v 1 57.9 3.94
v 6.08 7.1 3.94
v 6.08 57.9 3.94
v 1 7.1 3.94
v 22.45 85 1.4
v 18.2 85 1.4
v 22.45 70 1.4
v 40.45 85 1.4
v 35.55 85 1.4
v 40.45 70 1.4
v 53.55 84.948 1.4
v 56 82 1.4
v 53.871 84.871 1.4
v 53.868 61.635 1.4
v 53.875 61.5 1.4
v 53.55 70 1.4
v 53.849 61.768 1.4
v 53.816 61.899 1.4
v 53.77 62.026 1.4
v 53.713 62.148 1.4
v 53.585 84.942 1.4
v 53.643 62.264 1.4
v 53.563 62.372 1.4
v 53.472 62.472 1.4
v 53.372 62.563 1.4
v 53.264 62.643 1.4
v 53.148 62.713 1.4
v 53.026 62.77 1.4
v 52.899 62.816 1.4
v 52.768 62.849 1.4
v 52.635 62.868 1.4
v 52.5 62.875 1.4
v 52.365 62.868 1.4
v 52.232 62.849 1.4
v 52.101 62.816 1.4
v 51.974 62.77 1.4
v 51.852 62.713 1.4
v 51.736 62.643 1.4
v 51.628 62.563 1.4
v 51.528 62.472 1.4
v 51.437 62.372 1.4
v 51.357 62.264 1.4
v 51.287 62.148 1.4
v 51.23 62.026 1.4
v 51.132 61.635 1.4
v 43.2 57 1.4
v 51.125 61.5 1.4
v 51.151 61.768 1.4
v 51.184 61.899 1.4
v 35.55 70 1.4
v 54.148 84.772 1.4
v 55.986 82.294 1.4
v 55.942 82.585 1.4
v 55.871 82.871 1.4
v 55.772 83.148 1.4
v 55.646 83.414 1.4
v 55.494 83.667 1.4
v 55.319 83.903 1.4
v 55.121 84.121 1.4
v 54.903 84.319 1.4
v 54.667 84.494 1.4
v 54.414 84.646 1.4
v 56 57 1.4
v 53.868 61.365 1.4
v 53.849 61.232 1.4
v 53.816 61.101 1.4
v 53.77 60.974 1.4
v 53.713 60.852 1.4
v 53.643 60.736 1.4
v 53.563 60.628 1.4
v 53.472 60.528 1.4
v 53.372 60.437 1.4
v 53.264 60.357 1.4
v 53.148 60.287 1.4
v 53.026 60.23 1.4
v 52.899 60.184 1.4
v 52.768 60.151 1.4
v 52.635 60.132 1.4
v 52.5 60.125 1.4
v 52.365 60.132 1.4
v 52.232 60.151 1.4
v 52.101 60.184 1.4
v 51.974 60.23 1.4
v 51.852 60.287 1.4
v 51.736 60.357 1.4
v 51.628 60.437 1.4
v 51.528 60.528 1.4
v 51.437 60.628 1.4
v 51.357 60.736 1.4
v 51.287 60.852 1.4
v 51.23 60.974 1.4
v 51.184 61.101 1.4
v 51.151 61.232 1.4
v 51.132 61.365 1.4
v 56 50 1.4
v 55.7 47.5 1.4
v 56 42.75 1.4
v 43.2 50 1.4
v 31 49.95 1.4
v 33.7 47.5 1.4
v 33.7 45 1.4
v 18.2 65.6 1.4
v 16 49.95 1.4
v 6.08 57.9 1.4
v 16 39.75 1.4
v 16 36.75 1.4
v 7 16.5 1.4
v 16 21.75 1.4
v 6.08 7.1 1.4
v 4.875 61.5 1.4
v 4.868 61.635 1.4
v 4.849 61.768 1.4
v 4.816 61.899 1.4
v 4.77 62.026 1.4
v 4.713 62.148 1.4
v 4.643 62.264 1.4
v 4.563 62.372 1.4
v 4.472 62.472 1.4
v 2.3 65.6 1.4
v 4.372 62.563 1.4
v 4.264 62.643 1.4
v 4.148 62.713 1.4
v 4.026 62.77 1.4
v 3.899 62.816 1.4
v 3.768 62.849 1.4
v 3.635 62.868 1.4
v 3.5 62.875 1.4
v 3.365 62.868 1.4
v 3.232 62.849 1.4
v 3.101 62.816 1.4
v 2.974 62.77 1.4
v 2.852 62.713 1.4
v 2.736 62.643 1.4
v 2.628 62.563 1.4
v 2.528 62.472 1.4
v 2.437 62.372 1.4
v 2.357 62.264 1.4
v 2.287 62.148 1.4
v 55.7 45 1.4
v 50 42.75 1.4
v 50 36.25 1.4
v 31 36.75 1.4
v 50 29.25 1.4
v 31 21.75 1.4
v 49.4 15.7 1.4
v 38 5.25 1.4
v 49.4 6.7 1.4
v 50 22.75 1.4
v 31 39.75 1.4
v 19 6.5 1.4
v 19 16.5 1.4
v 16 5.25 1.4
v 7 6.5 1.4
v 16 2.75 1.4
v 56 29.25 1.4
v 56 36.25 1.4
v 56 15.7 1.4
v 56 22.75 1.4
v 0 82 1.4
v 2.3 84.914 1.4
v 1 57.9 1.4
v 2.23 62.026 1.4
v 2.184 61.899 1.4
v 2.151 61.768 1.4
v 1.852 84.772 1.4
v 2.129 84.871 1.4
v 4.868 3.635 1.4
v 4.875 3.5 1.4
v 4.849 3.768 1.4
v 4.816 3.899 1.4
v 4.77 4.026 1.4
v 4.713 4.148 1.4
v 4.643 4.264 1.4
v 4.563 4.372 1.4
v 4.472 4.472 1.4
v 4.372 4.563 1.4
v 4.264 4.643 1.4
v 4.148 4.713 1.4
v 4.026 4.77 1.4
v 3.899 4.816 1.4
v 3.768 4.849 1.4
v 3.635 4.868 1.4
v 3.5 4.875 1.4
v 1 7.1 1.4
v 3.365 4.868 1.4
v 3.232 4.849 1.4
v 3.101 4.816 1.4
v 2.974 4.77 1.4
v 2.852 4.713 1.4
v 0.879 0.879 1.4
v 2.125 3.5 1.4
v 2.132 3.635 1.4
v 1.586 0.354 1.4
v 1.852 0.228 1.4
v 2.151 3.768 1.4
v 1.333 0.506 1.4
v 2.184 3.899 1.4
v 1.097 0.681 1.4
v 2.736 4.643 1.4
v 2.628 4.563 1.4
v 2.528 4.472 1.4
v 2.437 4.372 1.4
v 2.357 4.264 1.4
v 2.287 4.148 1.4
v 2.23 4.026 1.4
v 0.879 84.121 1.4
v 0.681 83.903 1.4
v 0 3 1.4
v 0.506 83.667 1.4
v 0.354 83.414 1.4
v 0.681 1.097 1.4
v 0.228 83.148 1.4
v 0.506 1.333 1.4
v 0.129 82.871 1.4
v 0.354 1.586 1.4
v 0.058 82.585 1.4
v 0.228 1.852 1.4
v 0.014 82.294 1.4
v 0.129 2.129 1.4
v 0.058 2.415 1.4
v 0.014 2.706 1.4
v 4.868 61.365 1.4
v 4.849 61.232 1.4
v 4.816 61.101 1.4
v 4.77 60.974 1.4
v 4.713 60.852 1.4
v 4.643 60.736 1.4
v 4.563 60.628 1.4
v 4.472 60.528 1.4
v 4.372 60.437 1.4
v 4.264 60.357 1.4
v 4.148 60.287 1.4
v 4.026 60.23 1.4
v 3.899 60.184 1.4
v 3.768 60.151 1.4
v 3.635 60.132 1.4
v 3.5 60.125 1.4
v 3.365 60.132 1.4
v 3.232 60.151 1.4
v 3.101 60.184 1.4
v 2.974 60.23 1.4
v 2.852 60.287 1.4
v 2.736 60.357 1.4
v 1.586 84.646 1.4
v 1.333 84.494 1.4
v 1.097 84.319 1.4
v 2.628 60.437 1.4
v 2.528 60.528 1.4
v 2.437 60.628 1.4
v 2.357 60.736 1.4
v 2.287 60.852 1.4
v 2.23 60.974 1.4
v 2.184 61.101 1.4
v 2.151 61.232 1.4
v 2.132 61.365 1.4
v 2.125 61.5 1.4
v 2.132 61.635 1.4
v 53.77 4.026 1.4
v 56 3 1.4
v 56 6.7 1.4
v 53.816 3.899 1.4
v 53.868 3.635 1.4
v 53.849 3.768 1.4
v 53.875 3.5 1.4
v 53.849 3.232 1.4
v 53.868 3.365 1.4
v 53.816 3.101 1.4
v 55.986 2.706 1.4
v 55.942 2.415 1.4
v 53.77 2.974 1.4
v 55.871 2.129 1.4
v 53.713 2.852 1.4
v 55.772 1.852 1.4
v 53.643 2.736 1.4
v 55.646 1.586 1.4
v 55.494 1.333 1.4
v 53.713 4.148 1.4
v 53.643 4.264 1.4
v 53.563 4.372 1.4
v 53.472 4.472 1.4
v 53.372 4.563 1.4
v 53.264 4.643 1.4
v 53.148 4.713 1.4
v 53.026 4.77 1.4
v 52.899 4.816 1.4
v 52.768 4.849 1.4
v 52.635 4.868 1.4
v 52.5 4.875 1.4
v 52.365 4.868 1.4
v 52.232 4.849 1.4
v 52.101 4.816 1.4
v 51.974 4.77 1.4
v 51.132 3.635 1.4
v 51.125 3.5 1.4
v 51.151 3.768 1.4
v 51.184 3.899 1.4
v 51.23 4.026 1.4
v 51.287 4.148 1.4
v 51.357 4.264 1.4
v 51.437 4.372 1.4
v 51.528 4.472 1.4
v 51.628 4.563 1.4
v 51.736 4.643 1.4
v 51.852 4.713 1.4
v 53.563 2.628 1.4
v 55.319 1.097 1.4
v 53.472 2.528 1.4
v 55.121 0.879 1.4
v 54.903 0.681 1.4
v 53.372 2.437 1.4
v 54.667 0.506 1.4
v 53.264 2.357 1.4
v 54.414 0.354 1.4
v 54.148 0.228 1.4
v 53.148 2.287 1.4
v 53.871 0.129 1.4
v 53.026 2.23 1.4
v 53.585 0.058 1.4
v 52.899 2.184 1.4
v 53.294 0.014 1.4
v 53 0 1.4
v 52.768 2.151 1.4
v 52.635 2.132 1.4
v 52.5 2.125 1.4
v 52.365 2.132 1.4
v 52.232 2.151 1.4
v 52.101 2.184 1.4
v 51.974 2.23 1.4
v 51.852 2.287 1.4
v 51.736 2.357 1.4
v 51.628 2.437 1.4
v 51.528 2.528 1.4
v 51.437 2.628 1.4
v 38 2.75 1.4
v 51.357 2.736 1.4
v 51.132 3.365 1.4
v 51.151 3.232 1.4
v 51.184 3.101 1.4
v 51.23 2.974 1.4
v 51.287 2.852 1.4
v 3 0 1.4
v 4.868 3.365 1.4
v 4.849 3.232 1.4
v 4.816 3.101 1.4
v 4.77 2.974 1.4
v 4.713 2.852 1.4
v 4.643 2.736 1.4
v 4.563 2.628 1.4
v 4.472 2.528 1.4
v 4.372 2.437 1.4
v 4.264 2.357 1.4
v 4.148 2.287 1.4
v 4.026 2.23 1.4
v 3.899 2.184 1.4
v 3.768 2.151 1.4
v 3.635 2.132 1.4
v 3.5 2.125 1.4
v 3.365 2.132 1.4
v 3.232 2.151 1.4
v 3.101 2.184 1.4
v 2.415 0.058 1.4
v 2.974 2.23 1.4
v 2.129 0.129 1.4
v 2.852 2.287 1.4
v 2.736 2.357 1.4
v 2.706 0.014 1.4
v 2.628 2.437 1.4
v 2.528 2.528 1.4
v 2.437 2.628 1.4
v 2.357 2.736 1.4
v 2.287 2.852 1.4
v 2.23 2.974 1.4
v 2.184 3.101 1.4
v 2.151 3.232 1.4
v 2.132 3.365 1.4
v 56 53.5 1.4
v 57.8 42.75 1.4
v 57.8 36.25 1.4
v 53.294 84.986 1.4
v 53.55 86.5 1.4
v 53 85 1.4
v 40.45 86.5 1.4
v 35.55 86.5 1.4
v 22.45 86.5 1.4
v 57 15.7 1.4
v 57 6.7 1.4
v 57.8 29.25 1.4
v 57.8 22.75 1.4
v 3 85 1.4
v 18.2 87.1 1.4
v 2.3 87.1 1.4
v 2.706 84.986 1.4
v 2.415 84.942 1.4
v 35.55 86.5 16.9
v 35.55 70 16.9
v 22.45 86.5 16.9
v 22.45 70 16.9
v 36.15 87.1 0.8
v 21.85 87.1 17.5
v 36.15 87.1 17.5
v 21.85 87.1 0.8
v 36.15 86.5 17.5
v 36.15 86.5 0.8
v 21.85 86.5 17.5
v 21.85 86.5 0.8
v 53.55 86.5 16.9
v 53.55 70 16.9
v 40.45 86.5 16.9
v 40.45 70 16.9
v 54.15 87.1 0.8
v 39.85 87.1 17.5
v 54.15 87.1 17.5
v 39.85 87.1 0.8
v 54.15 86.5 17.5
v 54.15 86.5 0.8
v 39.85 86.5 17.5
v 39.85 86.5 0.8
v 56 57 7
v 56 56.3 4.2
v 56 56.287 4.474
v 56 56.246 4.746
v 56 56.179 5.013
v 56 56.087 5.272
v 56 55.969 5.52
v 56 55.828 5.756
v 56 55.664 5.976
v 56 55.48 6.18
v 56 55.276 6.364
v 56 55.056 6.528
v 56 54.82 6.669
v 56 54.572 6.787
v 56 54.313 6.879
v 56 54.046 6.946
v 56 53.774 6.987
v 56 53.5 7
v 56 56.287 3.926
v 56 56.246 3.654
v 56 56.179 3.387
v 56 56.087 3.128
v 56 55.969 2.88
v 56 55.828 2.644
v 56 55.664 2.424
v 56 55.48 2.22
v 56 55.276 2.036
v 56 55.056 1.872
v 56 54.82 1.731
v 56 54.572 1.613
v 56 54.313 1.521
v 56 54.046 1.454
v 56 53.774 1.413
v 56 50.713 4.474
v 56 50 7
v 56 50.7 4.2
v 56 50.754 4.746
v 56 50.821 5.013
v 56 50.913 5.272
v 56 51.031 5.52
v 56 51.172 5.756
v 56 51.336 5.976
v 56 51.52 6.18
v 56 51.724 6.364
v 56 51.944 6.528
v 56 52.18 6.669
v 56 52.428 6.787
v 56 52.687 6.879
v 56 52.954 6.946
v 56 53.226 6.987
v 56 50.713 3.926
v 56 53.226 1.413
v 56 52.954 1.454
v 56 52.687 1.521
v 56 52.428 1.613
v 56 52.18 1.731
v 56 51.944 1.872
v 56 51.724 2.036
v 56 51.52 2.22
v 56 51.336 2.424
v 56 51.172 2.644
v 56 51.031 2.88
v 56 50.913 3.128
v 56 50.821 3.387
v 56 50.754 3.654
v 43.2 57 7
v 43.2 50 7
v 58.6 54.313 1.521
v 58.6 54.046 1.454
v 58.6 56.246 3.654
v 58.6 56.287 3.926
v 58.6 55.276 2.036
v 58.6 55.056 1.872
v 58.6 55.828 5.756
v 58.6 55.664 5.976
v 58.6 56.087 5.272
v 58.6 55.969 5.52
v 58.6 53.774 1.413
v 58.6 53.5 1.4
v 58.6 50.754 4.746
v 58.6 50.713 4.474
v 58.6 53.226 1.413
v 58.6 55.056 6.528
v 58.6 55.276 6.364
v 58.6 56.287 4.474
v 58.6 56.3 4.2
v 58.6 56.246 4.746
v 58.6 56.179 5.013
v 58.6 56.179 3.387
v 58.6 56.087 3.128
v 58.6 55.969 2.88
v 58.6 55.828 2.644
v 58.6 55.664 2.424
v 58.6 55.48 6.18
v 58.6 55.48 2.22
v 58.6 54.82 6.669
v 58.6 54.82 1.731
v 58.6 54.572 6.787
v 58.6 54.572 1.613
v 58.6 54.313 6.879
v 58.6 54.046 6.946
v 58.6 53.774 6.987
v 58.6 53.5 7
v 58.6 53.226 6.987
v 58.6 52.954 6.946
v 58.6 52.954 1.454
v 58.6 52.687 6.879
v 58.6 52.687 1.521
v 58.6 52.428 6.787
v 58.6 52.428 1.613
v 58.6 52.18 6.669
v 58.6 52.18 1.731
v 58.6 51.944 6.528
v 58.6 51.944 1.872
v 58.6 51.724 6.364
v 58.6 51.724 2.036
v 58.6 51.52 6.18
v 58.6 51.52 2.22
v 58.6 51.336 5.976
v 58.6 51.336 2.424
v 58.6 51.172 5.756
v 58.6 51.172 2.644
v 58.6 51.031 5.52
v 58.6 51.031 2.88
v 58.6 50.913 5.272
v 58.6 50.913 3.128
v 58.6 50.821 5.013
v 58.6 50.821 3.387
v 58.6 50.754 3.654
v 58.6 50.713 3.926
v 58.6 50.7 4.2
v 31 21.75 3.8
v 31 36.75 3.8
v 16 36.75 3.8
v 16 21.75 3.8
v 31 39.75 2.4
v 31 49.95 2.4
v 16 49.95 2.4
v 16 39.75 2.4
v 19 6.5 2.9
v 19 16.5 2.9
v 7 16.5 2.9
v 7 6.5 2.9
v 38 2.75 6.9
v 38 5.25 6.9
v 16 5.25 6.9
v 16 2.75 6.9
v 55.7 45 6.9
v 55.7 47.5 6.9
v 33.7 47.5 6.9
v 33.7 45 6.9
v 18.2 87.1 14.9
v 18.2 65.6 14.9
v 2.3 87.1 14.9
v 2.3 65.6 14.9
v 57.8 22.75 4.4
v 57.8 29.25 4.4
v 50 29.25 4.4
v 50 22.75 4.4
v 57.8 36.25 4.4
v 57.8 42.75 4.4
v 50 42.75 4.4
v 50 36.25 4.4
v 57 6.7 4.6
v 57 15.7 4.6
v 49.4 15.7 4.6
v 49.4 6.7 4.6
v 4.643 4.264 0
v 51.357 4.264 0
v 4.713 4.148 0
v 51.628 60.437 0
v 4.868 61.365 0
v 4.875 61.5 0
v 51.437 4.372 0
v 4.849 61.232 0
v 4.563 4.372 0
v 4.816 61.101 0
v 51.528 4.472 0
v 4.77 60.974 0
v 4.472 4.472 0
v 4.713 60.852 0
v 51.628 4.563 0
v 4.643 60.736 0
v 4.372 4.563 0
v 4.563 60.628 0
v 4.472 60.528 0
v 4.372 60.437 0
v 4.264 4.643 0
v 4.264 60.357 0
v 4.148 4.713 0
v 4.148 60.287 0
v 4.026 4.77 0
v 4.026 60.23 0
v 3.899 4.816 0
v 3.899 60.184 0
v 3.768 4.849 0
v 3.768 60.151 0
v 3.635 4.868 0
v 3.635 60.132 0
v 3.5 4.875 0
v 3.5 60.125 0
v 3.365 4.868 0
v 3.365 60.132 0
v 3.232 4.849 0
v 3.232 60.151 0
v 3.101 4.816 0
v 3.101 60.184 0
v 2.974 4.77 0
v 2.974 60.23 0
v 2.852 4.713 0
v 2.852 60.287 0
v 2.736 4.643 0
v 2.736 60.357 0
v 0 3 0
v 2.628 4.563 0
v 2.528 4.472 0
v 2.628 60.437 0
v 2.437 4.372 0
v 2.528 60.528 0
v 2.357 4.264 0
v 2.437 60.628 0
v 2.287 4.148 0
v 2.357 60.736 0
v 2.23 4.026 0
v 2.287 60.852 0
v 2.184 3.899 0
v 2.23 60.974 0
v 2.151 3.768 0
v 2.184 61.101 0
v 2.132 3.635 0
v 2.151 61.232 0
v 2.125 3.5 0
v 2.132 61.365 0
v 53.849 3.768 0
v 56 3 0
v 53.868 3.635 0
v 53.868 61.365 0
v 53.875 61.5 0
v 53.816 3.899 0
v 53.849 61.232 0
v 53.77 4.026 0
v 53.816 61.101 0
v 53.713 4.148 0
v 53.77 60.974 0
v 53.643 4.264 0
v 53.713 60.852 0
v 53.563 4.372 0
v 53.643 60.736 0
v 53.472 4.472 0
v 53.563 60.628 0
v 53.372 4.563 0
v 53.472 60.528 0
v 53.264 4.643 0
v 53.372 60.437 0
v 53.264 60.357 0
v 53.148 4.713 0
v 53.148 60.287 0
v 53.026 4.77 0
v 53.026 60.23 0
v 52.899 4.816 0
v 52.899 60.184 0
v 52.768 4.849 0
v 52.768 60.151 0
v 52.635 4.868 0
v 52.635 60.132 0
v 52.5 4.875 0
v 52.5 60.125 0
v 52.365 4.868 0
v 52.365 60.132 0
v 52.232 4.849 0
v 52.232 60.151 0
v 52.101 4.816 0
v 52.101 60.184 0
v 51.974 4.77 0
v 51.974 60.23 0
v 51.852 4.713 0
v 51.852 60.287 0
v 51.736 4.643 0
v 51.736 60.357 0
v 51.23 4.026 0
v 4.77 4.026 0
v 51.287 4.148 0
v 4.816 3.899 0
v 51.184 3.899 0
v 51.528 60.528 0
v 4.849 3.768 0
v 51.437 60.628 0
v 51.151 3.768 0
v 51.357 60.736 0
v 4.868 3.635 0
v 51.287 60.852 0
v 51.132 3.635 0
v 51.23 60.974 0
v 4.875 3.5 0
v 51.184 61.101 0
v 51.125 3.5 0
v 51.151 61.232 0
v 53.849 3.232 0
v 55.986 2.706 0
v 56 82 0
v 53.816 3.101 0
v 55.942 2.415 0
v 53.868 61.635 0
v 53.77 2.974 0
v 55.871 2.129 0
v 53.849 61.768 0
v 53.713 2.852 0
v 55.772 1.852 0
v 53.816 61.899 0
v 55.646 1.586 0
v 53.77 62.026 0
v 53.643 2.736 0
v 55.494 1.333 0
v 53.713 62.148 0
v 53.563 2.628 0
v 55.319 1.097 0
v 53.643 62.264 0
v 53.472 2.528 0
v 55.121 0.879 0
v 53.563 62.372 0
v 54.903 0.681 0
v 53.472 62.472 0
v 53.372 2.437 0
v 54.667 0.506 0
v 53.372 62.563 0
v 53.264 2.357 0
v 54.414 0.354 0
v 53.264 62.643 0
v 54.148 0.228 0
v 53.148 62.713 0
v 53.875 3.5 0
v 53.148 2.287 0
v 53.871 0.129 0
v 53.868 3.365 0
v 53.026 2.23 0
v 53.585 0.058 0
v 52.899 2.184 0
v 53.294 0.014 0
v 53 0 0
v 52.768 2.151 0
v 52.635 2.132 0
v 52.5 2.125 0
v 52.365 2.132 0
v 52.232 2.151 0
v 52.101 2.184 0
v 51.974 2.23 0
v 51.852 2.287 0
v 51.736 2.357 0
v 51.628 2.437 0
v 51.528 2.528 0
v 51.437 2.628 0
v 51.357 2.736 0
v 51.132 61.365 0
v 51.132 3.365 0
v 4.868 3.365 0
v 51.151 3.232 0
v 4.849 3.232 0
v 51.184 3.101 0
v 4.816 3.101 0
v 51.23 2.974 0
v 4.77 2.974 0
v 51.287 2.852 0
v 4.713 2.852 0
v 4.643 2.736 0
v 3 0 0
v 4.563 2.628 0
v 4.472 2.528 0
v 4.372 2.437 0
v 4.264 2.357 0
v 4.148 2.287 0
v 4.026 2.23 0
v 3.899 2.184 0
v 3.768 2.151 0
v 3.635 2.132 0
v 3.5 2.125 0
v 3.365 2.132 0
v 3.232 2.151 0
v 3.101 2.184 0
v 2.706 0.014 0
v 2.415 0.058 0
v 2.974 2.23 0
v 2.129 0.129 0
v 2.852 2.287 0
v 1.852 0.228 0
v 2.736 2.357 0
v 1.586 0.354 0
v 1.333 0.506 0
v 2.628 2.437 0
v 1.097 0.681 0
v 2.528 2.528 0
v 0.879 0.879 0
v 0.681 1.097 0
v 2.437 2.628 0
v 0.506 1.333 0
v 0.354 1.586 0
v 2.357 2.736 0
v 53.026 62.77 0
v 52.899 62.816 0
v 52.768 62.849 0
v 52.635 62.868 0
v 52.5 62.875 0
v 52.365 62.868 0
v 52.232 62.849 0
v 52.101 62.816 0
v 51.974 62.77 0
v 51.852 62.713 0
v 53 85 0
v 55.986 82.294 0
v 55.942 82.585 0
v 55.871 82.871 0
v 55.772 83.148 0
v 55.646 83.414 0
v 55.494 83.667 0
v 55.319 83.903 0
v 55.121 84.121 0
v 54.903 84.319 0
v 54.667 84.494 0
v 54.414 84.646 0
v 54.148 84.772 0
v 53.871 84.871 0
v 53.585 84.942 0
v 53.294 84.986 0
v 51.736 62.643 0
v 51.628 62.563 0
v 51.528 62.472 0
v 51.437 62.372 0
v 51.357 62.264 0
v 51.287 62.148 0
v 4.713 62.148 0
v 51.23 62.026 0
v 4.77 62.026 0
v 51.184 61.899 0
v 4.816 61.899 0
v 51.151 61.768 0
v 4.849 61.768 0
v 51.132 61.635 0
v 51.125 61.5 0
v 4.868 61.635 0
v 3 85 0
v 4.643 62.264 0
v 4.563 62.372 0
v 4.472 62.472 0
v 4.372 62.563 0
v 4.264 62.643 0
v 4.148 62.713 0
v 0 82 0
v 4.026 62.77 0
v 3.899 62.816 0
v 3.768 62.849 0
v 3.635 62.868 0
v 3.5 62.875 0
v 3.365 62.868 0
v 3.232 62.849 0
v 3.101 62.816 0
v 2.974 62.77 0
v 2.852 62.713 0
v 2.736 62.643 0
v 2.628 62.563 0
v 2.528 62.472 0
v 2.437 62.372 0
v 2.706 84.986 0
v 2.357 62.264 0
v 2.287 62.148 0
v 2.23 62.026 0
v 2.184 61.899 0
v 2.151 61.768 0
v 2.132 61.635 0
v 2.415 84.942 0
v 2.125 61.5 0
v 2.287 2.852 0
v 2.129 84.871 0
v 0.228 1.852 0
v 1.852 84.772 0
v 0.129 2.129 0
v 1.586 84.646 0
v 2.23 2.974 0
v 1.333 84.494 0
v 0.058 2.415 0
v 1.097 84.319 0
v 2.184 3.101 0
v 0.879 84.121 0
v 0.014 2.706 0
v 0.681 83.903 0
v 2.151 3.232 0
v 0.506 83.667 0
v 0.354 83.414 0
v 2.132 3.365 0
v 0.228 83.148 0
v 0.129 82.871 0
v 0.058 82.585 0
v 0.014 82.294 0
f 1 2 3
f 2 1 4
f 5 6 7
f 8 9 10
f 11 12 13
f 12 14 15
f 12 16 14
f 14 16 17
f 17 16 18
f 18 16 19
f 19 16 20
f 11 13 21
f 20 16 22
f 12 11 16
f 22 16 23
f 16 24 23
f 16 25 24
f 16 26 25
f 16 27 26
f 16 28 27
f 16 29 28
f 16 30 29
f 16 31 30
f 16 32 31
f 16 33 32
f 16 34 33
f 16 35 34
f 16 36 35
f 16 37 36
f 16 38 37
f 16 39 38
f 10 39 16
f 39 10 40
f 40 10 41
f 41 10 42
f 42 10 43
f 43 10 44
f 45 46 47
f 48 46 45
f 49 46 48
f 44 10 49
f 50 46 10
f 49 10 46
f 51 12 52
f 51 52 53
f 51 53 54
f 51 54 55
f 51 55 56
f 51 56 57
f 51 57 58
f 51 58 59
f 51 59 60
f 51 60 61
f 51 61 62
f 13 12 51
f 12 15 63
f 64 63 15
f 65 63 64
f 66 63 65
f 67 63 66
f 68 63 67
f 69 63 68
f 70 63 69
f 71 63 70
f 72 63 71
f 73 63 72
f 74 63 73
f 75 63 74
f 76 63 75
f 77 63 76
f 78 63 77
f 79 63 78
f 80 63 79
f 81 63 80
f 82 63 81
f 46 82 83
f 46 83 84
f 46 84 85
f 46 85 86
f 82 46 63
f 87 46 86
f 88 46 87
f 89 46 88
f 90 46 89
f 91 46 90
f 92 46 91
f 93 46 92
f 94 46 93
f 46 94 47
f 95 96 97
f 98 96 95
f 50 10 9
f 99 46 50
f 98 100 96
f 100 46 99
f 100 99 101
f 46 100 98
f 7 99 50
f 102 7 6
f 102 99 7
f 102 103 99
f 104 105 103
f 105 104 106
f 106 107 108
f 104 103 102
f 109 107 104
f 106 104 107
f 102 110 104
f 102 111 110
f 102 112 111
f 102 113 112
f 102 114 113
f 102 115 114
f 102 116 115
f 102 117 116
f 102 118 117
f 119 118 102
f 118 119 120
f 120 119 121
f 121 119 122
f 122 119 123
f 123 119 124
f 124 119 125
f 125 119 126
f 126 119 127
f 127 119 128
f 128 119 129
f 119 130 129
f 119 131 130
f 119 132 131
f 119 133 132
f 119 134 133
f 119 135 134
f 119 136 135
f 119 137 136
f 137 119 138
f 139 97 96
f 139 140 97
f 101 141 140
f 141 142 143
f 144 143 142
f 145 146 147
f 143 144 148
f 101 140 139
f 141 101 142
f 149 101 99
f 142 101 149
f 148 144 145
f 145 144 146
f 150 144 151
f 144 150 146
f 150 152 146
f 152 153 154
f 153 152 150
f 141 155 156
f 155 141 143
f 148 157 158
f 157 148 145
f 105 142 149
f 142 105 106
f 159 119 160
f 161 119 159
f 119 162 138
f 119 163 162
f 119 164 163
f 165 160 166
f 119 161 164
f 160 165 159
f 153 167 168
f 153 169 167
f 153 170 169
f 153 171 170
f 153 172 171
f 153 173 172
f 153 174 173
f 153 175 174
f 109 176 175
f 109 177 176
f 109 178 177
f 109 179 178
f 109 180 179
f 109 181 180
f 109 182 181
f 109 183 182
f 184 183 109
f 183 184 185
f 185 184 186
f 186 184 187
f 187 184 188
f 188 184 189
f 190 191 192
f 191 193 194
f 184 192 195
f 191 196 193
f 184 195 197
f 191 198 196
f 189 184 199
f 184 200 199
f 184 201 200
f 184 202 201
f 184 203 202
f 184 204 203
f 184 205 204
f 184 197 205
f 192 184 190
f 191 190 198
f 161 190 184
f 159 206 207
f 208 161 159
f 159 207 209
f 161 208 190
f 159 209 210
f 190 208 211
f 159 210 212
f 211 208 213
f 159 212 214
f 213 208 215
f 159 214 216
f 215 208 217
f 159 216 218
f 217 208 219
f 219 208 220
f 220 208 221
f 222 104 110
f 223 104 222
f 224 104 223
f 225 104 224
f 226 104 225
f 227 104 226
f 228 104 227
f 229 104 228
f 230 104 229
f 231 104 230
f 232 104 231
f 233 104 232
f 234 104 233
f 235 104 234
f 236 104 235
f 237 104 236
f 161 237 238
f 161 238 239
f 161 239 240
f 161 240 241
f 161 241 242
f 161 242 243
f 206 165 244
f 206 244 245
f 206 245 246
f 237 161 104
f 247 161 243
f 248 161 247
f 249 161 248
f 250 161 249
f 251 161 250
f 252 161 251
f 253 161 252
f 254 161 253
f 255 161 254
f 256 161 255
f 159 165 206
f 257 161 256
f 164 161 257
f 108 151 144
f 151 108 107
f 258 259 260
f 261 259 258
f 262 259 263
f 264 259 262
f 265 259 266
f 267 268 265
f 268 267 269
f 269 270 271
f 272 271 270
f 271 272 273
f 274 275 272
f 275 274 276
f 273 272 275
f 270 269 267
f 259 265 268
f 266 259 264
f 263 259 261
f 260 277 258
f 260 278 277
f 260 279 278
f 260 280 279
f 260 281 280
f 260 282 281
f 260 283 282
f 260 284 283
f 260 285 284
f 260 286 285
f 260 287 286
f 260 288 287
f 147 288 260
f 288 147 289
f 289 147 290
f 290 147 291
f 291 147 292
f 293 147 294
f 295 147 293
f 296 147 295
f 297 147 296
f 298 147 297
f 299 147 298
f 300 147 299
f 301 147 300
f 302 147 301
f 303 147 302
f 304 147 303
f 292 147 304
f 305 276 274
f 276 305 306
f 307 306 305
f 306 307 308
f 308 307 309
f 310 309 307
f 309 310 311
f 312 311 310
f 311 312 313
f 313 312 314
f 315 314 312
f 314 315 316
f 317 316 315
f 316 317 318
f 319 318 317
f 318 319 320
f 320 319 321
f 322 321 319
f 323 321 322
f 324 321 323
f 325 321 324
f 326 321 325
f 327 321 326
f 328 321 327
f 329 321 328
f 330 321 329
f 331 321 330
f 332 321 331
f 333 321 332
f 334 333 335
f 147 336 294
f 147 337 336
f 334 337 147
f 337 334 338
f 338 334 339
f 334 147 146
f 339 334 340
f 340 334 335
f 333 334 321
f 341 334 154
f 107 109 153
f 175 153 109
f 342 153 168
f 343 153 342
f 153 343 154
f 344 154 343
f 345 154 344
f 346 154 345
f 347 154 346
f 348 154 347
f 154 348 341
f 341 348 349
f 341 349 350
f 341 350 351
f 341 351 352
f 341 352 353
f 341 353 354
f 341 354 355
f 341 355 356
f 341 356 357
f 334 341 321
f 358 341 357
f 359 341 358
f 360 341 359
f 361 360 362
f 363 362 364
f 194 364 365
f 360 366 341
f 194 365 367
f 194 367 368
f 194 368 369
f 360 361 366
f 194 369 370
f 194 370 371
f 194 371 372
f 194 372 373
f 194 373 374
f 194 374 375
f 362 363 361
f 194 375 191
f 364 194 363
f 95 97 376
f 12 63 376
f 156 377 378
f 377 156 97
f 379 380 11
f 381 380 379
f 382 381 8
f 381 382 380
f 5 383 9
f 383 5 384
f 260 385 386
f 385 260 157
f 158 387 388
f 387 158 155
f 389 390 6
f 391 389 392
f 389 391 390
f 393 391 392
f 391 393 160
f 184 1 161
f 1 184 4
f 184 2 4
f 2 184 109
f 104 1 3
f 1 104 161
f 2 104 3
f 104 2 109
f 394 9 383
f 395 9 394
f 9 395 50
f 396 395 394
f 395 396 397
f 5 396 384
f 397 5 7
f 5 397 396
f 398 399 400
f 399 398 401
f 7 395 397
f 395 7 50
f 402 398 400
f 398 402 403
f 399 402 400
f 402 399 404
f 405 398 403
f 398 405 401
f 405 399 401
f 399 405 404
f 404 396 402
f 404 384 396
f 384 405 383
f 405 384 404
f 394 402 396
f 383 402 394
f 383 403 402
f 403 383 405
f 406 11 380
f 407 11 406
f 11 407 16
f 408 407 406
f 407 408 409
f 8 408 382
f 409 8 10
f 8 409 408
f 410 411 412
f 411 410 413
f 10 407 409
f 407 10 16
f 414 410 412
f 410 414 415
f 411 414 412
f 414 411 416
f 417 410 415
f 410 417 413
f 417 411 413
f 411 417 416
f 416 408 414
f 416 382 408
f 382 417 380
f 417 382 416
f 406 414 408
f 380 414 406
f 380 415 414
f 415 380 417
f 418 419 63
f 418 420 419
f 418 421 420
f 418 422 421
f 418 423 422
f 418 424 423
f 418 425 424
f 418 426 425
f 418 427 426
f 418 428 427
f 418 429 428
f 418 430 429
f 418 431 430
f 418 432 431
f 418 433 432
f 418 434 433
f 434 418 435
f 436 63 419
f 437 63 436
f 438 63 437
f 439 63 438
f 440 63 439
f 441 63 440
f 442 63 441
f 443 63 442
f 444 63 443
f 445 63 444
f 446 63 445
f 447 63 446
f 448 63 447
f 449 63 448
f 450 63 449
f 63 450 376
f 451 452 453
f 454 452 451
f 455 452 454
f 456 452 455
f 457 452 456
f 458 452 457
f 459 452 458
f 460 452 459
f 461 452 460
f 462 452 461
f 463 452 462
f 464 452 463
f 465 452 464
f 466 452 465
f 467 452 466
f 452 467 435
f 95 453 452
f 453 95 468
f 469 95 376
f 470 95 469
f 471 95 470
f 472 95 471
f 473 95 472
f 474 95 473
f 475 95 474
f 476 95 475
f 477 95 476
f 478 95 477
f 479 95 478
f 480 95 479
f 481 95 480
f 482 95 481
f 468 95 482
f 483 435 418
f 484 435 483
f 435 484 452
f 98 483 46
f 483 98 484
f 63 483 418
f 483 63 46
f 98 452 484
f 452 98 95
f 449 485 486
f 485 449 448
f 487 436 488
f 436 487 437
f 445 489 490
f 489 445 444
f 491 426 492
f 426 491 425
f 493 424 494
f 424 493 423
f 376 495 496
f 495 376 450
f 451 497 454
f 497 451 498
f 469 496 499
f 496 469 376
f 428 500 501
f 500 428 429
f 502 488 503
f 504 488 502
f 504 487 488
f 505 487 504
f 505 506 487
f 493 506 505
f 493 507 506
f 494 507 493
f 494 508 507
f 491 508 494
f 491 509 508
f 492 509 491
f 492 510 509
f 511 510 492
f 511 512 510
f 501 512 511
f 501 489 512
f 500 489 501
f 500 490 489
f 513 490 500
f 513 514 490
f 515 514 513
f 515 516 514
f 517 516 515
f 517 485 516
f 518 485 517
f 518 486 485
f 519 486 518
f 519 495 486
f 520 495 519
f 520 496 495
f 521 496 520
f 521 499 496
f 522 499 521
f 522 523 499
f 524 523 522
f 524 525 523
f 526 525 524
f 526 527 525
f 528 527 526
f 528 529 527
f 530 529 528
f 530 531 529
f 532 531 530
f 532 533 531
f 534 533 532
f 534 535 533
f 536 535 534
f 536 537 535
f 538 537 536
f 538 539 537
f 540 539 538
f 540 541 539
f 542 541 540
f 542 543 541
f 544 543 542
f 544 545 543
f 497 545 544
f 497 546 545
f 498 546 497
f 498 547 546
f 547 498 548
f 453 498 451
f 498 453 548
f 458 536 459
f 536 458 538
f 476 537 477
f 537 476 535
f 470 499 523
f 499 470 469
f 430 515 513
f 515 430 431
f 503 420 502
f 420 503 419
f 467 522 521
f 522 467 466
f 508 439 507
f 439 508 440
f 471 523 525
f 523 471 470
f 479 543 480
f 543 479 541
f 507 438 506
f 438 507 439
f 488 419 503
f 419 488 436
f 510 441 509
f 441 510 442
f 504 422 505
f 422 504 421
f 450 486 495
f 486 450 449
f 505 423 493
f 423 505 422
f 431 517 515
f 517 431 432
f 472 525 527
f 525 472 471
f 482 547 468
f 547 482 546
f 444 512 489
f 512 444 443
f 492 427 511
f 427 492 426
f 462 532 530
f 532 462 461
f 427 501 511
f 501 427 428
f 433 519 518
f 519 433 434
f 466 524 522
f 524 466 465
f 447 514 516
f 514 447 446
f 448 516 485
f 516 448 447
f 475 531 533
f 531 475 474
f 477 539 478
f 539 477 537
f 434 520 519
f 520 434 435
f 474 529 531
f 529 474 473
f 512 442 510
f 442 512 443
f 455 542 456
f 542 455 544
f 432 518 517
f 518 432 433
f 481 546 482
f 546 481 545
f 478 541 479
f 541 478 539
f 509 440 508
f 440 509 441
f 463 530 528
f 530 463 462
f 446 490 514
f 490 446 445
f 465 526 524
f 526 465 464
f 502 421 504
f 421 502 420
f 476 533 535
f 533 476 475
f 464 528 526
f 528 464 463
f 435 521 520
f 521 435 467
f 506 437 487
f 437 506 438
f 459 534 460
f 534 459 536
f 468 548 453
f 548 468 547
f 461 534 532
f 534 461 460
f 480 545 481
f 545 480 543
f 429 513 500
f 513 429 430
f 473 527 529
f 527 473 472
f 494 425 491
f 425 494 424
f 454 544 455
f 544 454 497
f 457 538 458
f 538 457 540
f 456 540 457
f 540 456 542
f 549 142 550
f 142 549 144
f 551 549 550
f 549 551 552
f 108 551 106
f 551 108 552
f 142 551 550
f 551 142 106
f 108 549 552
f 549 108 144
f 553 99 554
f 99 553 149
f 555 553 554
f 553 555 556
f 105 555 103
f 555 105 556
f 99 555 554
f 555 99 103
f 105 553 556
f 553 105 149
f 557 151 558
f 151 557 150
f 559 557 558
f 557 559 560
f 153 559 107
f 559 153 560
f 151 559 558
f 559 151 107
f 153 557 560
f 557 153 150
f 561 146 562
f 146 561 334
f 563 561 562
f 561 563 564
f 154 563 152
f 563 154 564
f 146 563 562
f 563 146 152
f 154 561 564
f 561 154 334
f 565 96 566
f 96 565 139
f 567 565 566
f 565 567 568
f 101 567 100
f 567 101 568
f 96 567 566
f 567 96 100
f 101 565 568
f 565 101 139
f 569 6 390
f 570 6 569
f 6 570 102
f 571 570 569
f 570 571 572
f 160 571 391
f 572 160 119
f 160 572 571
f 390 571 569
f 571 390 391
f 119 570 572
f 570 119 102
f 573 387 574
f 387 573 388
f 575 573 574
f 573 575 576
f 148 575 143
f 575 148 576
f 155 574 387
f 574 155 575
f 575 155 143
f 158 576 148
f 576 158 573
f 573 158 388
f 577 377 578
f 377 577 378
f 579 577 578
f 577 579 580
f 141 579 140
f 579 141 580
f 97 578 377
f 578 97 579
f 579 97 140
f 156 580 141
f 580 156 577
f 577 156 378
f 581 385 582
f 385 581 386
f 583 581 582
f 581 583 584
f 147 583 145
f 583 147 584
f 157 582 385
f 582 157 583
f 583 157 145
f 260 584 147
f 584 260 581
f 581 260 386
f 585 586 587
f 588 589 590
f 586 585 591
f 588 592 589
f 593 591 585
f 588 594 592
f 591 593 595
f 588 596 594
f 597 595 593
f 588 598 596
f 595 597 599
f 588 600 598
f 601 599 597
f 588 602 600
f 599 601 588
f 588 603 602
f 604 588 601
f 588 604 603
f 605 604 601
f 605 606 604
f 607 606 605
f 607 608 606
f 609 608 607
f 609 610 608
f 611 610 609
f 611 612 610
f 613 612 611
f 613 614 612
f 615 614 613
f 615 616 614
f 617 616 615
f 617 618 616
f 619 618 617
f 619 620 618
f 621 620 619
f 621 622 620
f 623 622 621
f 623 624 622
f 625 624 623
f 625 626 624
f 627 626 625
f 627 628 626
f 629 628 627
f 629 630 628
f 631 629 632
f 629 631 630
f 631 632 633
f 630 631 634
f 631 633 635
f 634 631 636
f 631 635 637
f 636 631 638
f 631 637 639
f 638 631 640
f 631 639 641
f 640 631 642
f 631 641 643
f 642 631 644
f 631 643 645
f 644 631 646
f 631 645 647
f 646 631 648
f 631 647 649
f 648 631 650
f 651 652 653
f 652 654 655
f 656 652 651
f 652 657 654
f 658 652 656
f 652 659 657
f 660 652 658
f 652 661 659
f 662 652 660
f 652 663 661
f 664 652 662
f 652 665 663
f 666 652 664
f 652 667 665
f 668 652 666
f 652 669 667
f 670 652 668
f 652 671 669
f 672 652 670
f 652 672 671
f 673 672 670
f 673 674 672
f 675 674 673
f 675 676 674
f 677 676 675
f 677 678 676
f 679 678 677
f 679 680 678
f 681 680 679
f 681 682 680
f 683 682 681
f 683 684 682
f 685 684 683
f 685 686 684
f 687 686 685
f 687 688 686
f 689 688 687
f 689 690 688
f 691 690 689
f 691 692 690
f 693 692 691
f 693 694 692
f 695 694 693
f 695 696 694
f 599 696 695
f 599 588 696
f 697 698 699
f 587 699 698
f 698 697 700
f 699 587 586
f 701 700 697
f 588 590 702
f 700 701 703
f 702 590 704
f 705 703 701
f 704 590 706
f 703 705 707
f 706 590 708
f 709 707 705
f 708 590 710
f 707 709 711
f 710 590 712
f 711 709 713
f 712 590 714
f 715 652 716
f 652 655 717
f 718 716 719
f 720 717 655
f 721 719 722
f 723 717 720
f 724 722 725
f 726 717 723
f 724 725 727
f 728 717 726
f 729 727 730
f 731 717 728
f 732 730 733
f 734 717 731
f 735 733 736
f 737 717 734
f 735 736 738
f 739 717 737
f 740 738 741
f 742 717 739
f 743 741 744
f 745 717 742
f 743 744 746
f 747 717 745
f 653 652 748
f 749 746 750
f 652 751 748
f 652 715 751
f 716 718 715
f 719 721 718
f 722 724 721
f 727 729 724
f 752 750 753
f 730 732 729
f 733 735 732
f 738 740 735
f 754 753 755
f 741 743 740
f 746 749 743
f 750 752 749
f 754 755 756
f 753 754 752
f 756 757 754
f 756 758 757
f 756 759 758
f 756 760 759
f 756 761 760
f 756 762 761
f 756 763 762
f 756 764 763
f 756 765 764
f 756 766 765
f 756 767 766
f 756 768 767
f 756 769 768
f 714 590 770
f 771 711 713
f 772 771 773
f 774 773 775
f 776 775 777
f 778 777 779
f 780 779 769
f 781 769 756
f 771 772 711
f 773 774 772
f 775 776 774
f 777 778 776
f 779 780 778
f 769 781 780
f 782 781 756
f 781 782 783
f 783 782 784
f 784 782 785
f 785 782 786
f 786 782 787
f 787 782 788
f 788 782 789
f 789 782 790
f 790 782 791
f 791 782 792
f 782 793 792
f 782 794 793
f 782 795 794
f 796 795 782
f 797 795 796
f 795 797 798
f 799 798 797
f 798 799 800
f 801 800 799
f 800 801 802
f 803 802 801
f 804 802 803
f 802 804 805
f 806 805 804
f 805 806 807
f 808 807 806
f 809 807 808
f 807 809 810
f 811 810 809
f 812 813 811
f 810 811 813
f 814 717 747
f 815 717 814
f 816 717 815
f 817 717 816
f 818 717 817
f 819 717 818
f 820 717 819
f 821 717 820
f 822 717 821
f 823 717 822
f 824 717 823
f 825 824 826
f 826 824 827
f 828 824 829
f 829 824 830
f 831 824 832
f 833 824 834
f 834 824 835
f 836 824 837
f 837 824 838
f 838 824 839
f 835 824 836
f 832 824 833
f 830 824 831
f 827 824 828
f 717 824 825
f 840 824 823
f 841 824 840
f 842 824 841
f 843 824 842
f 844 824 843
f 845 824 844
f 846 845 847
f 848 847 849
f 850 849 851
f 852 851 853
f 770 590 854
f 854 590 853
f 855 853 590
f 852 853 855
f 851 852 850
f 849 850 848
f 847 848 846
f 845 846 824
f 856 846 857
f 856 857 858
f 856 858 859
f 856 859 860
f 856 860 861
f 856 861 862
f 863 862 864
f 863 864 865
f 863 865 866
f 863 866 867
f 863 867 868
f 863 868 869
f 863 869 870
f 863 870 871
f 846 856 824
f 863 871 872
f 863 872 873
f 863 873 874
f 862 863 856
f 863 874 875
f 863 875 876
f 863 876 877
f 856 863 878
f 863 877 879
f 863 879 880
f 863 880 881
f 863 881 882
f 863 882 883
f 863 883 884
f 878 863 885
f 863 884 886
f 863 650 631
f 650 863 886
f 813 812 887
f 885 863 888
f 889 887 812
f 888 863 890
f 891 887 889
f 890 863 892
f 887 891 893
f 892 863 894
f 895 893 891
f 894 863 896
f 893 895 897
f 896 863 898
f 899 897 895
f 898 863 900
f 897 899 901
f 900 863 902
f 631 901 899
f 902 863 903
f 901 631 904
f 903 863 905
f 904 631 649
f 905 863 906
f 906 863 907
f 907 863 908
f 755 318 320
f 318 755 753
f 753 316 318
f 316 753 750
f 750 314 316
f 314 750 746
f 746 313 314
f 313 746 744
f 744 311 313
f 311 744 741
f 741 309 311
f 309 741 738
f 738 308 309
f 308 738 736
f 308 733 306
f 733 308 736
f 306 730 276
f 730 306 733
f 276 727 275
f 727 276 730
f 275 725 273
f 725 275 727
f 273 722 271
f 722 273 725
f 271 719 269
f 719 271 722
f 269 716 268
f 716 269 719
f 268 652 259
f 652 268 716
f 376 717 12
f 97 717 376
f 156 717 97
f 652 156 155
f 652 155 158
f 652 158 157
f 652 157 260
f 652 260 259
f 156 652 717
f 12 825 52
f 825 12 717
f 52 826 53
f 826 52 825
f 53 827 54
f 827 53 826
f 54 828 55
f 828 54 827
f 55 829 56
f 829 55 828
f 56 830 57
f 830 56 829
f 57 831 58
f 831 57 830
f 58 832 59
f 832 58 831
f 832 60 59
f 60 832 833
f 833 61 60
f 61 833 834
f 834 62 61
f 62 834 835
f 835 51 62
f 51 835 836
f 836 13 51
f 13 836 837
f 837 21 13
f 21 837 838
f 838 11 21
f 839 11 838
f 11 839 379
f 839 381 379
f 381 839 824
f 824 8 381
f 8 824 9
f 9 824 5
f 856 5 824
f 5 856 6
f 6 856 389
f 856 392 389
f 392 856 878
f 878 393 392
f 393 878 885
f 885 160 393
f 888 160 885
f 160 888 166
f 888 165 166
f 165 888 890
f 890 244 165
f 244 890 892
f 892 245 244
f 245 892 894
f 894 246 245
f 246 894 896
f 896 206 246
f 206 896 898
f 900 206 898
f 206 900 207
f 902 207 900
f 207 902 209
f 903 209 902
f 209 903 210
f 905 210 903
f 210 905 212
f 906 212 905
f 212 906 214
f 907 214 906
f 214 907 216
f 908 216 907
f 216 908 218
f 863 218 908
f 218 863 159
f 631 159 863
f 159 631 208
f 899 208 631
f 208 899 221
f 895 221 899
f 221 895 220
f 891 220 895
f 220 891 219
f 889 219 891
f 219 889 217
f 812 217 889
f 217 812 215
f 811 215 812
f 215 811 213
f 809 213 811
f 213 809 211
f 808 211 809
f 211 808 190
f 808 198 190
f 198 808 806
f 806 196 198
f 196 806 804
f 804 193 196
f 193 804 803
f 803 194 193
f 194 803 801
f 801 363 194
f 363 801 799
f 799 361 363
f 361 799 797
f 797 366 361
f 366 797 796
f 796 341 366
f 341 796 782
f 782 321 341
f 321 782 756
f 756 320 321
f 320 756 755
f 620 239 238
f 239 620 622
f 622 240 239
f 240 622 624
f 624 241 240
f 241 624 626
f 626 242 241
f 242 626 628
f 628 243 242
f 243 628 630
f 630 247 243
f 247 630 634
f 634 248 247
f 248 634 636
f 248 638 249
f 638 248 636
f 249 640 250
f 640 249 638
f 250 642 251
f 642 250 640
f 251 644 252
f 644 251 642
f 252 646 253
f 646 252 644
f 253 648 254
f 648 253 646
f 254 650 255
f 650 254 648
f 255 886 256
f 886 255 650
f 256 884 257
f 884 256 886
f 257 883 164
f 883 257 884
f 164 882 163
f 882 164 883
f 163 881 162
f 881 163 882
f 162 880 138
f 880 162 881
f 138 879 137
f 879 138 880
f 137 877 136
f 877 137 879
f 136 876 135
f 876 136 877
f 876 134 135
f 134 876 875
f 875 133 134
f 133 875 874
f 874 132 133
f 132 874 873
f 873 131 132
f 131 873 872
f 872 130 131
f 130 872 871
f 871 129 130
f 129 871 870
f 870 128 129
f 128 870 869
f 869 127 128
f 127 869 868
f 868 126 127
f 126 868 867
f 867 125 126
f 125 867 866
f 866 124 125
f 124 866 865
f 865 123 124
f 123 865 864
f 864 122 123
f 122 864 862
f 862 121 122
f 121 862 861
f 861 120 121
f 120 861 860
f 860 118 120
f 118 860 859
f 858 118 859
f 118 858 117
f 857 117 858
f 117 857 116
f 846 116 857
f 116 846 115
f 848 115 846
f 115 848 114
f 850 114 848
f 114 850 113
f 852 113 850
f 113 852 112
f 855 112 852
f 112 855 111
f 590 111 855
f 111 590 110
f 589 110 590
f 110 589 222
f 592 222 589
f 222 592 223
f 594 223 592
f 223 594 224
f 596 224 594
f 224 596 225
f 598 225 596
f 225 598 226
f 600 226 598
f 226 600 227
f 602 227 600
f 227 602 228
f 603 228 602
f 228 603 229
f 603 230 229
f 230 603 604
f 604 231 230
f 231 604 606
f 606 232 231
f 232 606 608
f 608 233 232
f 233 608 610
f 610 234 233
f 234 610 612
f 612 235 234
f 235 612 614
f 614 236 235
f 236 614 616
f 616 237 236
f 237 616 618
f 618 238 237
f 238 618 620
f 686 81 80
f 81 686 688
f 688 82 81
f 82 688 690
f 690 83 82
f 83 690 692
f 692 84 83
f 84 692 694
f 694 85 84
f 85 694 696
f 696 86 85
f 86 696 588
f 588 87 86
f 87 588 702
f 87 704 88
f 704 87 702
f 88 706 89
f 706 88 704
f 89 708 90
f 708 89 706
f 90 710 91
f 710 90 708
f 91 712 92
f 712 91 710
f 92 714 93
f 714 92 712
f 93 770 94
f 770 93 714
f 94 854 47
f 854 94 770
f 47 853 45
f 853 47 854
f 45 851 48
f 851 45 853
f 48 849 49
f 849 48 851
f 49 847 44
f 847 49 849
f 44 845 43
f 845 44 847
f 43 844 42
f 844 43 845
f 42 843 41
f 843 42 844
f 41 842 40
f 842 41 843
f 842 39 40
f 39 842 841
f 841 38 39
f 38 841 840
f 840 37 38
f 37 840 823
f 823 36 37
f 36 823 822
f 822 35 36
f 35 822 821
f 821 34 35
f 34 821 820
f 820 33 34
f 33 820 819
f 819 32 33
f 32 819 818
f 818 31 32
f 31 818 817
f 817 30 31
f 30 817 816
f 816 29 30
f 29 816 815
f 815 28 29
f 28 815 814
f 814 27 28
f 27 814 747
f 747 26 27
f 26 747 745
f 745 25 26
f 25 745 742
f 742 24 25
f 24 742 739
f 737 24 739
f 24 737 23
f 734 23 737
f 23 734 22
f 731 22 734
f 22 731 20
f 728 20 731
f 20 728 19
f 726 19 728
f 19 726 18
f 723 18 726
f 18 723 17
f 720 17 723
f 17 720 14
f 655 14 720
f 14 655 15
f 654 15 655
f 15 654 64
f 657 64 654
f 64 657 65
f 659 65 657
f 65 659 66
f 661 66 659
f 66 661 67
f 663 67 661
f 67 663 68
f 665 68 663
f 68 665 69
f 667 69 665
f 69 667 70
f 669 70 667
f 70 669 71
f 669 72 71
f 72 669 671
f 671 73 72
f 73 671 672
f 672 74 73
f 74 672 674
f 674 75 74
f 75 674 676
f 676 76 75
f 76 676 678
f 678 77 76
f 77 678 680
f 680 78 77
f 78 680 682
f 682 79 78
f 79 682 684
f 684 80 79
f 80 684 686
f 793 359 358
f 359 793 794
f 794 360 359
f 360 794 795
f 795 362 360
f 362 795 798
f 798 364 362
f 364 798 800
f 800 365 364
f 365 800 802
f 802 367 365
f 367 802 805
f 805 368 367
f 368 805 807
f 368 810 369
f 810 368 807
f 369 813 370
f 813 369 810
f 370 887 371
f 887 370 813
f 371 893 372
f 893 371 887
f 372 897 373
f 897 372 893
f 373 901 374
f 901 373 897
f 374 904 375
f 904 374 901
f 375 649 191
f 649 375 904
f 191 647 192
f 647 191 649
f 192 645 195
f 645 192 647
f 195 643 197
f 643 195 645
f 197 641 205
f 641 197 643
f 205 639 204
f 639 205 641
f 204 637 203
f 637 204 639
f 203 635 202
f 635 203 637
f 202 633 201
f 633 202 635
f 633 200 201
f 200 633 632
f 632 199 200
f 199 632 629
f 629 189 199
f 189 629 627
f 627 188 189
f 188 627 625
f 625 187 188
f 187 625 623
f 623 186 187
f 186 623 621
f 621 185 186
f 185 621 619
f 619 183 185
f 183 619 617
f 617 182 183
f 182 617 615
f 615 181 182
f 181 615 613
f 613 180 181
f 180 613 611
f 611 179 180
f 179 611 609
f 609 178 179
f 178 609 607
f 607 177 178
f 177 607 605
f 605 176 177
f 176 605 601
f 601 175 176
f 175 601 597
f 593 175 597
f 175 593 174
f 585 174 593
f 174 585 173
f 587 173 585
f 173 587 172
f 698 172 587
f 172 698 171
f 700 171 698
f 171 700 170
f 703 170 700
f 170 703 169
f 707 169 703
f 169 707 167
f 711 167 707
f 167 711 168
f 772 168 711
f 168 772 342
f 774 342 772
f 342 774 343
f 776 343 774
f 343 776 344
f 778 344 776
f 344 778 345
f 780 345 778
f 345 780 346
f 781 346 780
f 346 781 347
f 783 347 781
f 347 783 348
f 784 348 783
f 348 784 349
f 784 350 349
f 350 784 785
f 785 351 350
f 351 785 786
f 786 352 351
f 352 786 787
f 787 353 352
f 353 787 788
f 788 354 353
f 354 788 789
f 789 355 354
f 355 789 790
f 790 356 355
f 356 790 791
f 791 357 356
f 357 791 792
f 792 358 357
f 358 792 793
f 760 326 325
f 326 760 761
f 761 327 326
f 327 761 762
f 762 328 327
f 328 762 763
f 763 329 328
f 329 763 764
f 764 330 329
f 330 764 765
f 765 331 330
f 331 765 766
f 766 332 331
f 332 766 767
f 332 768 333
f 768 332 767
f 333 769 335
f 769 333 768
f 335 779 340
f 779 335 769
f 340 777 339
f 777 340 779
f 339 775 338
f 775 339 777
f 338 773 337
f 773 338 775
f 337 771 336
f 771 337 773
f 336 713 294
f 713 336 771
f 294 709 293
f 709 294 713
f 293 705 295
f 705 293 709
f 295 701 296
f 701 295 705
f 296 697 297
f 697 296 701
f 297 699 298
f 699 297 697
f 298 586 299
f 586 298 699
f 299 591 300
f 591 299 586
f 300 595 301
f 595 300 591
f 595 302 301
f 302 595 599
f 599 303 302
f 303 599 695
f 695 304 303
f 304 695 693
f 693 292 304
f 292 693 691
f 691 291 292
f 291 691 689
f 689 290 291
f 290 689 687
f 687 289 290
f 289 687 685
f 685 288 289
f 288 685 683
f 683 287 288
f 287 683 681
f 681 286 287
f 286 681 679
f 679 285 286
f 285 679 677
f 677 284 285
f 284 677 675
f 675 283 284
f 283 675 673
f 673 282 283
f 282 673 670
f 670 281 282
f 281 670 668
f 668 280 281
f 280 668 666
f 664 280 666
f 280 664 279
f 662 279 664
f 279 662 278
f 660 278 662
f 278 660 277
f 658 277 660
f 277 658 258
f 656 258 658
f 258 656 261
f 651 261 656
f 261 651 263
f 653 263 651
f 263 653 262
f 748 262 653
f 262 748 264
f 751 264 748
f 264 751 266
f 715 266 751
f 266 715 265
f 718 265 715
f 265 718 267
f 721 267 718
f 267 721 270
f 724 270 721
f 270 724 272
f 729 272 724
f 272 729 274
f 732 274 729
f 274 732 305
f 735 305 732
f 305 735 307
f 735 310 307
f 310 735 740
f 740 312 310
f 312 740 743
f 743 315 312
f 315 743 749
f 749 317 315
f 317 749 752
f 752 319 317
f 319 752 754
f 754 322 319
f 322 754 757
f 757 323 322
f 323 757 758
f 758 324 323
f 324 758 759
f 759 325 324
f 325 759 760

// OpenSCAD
//------------------------------------------------------------------------
// OpenSCAD models of miscellaneous components and devices:
// various Raspberry Pi models, SainSmart Relays, PCD8544 LCD, etc.
//
// Author:      Niccolo Rigacci <niccolo@rigacci.org>
// Version:     1.0 2017-12-14
// License:     GNU General Public License v3.0
// Modified:    by Richard Jelbert 5th January 2021 for RPi 4
//------------------------------------------------------------------------

// Interference for 3D union(), difference() and intersection();
// used to avoid the manifold problem.
interf = 0.2;

//------------------------------------------------------------------------
// Matrix of 2.54 mm pins.
//------------------------------------------------------------------------
module pin_headers(cols, rows) {
    w = 2.54; h = 2.54; p = 0.65;
    for(x = [0 : (cols -1)]) {
        for(y = [0 : (rows  - 1)]) {
            translate([w * x, w * y, 0]) {
                union() {
                    color("black") cube([w, w, h]);
                    //color("gold")  translate([(w - p) / 2, (w - p) / 2, -3]) cube([p, p, 11.54]);
                }
            }
        }
    }
}

//------------------------------------------------------------------------
// Sub-models for the Raspberry Pi 4 Model
//------------------------------------------------------------------------

module ethernet_connector(x, y, z) {
    color("silver") cube([x, y, z]);
}
module usb_connector(x, y, z) {
    f = 0.6; // Flange
    color("silver") cube([x, y, z]);
    translate([-f, y - f, -f])
        color("silver") cube([x + f * 2, f, z + f * 2]);
}
module hdmi_connector(x, y, z) {
    color("silver") cube([x, y, z]);
}
module usbc_connector(x, y, z) {
    color("silver") cube([x, y, z]);
}
module capacitor(d, h) {
    color("silver") cylinder(r=(d / 2), h=h);
}
module micro_sd_card() {
    color("silver")   translate([1.5,  0.0, -1.5]) cube([12, 12.5, 1.5]);
    color("orange") translate([2, -3.2, -1.0]) cube([11, 15, 1.0]);
}
module audio_video(size_x) {
    fn = 64;
    color([58/255, 58/255, 58/255]) {
        cube([size_x, 7, 5.6]);
        translate([size_x, 7 / 2, 5.6 / 2]) rotate([0,90,0]) cylinder(d=5.6, h=2.6, $fn = fn);
    }

}
module cpu() {
    color("silver")
    cube([15,15,2.4]);
}

module ram() {
    color("black")
    cube([15,10.2,1]);
}

module wifi(){
    color("silver")
    cube([12,10,1.5]); 
}   

module cameracon(){
    color("black")
    cube([22,2.5,5.5]);
}


//------------------------------------------------------------------------
// Raspberry Pi 4 Model B
//------------------------------------------------------------------------
module board_raspberrypi_4_model_b() {
    fn = 64;
    x  = 56;     y = 85;    z = 1.40;  // Measured PCB size
    ex = 15.9; ey = 21.5; ez = 13.5;   // Ethernet port size
    ux = 13.1; uy = 17.1; uz = 15.5;   // Measured USB connector size
    hx = 7.80; hy = 6.5; hz = 3;  // Measured micro HDMI connector size
    mx =  7.60; my =  9; mz = 3.20;  // Measured USB-C power connector size
    // The origin is the lower face of PCB.
    translate([0, 0, z]) {
        
        translate([56-32.5-7.5,3.5+25.75-7.5,0])  cpu();
        translate([56-32.5-7.5,3.5+43.75-7.5,0])  ram();
        translate([7,6.5,0])    wifi();
        translate([(56/2)-12,(4-1.25),0]) cameracon();
        translate([(56)-22.3,(45),0]) cameracon();
        translate([1.0, 7.1, 0])    pin_headers(2, 20);
        translate([x-(ex/2)-45.75, y - ey + 2.1, 0])    ethernet_connector(ex, ey, ez);
        translate([x-(ux/2)-27, 85 - uy + 2.1, 0])  usb_connector(ux, uy, uz);
        translate([x-(ux/2)-9, 85 - uy + 2.1, 0])   usb_connector(ux, uy, uz);
        translate([x - hx + 1.8, (3.5+7.7+14.8-(hy/2)), 0]) hdmi_connector(hx, hy, hz);
        translate([x - hx + 1.8, (3.5+7.7+14.8+13.5-(hy/2)), 0])    hdmi_connector(hx, hy, hz);
        translate([x - 12.8, 50, 0])    audio_video(12.8);
        translate([x - mx + 1, (3.5+7.7-(my/2)), 0])    usbc_connector(mx, my, mz);
        //translate([20.5, 0.8, -z])  micro_sd_card();
        translate([0, 0, -z]) {
            color("green") linear_extrude(height=z)
                difference() {
                    hull() {
                        translate([  3,   3]) circle(r=3, $fn = fn);
                        translate([x-3,   3]) circle(r=3, $fn = fn);
                        translate([x-3, y-3]) circle(r=3, $fn = fn);
                        translate([  3, y-3]) circle(r=3, $fn = fn);
                    }
                    raspberrypi_4_model_b_holes();
                }
        }
    }
}

//------------------------------------------------------------------------
// Holes for Raspberry Pi 4 Model B
//------------------------------------------------------------------------
module raspberrypi_4_model_b_holes() {
    x = 56;
    fn = 64;
    translate([3.5, 3.5])            circle(r=(2.75 / 2), $fn=fn);
    translate([(x - 3.5), 3.5])      circle(r=(2.75 / 2), $fn=fn);
    translate([3.5, 3.5 + 58])       circle(r=(2.75 / 2), $fn=fn);
    translate([(x - 3.5), 3.5 + 58]) circle(r=(2.75 / 2), $fn=fn);
}



board_raspberrypi_4_model_b();
